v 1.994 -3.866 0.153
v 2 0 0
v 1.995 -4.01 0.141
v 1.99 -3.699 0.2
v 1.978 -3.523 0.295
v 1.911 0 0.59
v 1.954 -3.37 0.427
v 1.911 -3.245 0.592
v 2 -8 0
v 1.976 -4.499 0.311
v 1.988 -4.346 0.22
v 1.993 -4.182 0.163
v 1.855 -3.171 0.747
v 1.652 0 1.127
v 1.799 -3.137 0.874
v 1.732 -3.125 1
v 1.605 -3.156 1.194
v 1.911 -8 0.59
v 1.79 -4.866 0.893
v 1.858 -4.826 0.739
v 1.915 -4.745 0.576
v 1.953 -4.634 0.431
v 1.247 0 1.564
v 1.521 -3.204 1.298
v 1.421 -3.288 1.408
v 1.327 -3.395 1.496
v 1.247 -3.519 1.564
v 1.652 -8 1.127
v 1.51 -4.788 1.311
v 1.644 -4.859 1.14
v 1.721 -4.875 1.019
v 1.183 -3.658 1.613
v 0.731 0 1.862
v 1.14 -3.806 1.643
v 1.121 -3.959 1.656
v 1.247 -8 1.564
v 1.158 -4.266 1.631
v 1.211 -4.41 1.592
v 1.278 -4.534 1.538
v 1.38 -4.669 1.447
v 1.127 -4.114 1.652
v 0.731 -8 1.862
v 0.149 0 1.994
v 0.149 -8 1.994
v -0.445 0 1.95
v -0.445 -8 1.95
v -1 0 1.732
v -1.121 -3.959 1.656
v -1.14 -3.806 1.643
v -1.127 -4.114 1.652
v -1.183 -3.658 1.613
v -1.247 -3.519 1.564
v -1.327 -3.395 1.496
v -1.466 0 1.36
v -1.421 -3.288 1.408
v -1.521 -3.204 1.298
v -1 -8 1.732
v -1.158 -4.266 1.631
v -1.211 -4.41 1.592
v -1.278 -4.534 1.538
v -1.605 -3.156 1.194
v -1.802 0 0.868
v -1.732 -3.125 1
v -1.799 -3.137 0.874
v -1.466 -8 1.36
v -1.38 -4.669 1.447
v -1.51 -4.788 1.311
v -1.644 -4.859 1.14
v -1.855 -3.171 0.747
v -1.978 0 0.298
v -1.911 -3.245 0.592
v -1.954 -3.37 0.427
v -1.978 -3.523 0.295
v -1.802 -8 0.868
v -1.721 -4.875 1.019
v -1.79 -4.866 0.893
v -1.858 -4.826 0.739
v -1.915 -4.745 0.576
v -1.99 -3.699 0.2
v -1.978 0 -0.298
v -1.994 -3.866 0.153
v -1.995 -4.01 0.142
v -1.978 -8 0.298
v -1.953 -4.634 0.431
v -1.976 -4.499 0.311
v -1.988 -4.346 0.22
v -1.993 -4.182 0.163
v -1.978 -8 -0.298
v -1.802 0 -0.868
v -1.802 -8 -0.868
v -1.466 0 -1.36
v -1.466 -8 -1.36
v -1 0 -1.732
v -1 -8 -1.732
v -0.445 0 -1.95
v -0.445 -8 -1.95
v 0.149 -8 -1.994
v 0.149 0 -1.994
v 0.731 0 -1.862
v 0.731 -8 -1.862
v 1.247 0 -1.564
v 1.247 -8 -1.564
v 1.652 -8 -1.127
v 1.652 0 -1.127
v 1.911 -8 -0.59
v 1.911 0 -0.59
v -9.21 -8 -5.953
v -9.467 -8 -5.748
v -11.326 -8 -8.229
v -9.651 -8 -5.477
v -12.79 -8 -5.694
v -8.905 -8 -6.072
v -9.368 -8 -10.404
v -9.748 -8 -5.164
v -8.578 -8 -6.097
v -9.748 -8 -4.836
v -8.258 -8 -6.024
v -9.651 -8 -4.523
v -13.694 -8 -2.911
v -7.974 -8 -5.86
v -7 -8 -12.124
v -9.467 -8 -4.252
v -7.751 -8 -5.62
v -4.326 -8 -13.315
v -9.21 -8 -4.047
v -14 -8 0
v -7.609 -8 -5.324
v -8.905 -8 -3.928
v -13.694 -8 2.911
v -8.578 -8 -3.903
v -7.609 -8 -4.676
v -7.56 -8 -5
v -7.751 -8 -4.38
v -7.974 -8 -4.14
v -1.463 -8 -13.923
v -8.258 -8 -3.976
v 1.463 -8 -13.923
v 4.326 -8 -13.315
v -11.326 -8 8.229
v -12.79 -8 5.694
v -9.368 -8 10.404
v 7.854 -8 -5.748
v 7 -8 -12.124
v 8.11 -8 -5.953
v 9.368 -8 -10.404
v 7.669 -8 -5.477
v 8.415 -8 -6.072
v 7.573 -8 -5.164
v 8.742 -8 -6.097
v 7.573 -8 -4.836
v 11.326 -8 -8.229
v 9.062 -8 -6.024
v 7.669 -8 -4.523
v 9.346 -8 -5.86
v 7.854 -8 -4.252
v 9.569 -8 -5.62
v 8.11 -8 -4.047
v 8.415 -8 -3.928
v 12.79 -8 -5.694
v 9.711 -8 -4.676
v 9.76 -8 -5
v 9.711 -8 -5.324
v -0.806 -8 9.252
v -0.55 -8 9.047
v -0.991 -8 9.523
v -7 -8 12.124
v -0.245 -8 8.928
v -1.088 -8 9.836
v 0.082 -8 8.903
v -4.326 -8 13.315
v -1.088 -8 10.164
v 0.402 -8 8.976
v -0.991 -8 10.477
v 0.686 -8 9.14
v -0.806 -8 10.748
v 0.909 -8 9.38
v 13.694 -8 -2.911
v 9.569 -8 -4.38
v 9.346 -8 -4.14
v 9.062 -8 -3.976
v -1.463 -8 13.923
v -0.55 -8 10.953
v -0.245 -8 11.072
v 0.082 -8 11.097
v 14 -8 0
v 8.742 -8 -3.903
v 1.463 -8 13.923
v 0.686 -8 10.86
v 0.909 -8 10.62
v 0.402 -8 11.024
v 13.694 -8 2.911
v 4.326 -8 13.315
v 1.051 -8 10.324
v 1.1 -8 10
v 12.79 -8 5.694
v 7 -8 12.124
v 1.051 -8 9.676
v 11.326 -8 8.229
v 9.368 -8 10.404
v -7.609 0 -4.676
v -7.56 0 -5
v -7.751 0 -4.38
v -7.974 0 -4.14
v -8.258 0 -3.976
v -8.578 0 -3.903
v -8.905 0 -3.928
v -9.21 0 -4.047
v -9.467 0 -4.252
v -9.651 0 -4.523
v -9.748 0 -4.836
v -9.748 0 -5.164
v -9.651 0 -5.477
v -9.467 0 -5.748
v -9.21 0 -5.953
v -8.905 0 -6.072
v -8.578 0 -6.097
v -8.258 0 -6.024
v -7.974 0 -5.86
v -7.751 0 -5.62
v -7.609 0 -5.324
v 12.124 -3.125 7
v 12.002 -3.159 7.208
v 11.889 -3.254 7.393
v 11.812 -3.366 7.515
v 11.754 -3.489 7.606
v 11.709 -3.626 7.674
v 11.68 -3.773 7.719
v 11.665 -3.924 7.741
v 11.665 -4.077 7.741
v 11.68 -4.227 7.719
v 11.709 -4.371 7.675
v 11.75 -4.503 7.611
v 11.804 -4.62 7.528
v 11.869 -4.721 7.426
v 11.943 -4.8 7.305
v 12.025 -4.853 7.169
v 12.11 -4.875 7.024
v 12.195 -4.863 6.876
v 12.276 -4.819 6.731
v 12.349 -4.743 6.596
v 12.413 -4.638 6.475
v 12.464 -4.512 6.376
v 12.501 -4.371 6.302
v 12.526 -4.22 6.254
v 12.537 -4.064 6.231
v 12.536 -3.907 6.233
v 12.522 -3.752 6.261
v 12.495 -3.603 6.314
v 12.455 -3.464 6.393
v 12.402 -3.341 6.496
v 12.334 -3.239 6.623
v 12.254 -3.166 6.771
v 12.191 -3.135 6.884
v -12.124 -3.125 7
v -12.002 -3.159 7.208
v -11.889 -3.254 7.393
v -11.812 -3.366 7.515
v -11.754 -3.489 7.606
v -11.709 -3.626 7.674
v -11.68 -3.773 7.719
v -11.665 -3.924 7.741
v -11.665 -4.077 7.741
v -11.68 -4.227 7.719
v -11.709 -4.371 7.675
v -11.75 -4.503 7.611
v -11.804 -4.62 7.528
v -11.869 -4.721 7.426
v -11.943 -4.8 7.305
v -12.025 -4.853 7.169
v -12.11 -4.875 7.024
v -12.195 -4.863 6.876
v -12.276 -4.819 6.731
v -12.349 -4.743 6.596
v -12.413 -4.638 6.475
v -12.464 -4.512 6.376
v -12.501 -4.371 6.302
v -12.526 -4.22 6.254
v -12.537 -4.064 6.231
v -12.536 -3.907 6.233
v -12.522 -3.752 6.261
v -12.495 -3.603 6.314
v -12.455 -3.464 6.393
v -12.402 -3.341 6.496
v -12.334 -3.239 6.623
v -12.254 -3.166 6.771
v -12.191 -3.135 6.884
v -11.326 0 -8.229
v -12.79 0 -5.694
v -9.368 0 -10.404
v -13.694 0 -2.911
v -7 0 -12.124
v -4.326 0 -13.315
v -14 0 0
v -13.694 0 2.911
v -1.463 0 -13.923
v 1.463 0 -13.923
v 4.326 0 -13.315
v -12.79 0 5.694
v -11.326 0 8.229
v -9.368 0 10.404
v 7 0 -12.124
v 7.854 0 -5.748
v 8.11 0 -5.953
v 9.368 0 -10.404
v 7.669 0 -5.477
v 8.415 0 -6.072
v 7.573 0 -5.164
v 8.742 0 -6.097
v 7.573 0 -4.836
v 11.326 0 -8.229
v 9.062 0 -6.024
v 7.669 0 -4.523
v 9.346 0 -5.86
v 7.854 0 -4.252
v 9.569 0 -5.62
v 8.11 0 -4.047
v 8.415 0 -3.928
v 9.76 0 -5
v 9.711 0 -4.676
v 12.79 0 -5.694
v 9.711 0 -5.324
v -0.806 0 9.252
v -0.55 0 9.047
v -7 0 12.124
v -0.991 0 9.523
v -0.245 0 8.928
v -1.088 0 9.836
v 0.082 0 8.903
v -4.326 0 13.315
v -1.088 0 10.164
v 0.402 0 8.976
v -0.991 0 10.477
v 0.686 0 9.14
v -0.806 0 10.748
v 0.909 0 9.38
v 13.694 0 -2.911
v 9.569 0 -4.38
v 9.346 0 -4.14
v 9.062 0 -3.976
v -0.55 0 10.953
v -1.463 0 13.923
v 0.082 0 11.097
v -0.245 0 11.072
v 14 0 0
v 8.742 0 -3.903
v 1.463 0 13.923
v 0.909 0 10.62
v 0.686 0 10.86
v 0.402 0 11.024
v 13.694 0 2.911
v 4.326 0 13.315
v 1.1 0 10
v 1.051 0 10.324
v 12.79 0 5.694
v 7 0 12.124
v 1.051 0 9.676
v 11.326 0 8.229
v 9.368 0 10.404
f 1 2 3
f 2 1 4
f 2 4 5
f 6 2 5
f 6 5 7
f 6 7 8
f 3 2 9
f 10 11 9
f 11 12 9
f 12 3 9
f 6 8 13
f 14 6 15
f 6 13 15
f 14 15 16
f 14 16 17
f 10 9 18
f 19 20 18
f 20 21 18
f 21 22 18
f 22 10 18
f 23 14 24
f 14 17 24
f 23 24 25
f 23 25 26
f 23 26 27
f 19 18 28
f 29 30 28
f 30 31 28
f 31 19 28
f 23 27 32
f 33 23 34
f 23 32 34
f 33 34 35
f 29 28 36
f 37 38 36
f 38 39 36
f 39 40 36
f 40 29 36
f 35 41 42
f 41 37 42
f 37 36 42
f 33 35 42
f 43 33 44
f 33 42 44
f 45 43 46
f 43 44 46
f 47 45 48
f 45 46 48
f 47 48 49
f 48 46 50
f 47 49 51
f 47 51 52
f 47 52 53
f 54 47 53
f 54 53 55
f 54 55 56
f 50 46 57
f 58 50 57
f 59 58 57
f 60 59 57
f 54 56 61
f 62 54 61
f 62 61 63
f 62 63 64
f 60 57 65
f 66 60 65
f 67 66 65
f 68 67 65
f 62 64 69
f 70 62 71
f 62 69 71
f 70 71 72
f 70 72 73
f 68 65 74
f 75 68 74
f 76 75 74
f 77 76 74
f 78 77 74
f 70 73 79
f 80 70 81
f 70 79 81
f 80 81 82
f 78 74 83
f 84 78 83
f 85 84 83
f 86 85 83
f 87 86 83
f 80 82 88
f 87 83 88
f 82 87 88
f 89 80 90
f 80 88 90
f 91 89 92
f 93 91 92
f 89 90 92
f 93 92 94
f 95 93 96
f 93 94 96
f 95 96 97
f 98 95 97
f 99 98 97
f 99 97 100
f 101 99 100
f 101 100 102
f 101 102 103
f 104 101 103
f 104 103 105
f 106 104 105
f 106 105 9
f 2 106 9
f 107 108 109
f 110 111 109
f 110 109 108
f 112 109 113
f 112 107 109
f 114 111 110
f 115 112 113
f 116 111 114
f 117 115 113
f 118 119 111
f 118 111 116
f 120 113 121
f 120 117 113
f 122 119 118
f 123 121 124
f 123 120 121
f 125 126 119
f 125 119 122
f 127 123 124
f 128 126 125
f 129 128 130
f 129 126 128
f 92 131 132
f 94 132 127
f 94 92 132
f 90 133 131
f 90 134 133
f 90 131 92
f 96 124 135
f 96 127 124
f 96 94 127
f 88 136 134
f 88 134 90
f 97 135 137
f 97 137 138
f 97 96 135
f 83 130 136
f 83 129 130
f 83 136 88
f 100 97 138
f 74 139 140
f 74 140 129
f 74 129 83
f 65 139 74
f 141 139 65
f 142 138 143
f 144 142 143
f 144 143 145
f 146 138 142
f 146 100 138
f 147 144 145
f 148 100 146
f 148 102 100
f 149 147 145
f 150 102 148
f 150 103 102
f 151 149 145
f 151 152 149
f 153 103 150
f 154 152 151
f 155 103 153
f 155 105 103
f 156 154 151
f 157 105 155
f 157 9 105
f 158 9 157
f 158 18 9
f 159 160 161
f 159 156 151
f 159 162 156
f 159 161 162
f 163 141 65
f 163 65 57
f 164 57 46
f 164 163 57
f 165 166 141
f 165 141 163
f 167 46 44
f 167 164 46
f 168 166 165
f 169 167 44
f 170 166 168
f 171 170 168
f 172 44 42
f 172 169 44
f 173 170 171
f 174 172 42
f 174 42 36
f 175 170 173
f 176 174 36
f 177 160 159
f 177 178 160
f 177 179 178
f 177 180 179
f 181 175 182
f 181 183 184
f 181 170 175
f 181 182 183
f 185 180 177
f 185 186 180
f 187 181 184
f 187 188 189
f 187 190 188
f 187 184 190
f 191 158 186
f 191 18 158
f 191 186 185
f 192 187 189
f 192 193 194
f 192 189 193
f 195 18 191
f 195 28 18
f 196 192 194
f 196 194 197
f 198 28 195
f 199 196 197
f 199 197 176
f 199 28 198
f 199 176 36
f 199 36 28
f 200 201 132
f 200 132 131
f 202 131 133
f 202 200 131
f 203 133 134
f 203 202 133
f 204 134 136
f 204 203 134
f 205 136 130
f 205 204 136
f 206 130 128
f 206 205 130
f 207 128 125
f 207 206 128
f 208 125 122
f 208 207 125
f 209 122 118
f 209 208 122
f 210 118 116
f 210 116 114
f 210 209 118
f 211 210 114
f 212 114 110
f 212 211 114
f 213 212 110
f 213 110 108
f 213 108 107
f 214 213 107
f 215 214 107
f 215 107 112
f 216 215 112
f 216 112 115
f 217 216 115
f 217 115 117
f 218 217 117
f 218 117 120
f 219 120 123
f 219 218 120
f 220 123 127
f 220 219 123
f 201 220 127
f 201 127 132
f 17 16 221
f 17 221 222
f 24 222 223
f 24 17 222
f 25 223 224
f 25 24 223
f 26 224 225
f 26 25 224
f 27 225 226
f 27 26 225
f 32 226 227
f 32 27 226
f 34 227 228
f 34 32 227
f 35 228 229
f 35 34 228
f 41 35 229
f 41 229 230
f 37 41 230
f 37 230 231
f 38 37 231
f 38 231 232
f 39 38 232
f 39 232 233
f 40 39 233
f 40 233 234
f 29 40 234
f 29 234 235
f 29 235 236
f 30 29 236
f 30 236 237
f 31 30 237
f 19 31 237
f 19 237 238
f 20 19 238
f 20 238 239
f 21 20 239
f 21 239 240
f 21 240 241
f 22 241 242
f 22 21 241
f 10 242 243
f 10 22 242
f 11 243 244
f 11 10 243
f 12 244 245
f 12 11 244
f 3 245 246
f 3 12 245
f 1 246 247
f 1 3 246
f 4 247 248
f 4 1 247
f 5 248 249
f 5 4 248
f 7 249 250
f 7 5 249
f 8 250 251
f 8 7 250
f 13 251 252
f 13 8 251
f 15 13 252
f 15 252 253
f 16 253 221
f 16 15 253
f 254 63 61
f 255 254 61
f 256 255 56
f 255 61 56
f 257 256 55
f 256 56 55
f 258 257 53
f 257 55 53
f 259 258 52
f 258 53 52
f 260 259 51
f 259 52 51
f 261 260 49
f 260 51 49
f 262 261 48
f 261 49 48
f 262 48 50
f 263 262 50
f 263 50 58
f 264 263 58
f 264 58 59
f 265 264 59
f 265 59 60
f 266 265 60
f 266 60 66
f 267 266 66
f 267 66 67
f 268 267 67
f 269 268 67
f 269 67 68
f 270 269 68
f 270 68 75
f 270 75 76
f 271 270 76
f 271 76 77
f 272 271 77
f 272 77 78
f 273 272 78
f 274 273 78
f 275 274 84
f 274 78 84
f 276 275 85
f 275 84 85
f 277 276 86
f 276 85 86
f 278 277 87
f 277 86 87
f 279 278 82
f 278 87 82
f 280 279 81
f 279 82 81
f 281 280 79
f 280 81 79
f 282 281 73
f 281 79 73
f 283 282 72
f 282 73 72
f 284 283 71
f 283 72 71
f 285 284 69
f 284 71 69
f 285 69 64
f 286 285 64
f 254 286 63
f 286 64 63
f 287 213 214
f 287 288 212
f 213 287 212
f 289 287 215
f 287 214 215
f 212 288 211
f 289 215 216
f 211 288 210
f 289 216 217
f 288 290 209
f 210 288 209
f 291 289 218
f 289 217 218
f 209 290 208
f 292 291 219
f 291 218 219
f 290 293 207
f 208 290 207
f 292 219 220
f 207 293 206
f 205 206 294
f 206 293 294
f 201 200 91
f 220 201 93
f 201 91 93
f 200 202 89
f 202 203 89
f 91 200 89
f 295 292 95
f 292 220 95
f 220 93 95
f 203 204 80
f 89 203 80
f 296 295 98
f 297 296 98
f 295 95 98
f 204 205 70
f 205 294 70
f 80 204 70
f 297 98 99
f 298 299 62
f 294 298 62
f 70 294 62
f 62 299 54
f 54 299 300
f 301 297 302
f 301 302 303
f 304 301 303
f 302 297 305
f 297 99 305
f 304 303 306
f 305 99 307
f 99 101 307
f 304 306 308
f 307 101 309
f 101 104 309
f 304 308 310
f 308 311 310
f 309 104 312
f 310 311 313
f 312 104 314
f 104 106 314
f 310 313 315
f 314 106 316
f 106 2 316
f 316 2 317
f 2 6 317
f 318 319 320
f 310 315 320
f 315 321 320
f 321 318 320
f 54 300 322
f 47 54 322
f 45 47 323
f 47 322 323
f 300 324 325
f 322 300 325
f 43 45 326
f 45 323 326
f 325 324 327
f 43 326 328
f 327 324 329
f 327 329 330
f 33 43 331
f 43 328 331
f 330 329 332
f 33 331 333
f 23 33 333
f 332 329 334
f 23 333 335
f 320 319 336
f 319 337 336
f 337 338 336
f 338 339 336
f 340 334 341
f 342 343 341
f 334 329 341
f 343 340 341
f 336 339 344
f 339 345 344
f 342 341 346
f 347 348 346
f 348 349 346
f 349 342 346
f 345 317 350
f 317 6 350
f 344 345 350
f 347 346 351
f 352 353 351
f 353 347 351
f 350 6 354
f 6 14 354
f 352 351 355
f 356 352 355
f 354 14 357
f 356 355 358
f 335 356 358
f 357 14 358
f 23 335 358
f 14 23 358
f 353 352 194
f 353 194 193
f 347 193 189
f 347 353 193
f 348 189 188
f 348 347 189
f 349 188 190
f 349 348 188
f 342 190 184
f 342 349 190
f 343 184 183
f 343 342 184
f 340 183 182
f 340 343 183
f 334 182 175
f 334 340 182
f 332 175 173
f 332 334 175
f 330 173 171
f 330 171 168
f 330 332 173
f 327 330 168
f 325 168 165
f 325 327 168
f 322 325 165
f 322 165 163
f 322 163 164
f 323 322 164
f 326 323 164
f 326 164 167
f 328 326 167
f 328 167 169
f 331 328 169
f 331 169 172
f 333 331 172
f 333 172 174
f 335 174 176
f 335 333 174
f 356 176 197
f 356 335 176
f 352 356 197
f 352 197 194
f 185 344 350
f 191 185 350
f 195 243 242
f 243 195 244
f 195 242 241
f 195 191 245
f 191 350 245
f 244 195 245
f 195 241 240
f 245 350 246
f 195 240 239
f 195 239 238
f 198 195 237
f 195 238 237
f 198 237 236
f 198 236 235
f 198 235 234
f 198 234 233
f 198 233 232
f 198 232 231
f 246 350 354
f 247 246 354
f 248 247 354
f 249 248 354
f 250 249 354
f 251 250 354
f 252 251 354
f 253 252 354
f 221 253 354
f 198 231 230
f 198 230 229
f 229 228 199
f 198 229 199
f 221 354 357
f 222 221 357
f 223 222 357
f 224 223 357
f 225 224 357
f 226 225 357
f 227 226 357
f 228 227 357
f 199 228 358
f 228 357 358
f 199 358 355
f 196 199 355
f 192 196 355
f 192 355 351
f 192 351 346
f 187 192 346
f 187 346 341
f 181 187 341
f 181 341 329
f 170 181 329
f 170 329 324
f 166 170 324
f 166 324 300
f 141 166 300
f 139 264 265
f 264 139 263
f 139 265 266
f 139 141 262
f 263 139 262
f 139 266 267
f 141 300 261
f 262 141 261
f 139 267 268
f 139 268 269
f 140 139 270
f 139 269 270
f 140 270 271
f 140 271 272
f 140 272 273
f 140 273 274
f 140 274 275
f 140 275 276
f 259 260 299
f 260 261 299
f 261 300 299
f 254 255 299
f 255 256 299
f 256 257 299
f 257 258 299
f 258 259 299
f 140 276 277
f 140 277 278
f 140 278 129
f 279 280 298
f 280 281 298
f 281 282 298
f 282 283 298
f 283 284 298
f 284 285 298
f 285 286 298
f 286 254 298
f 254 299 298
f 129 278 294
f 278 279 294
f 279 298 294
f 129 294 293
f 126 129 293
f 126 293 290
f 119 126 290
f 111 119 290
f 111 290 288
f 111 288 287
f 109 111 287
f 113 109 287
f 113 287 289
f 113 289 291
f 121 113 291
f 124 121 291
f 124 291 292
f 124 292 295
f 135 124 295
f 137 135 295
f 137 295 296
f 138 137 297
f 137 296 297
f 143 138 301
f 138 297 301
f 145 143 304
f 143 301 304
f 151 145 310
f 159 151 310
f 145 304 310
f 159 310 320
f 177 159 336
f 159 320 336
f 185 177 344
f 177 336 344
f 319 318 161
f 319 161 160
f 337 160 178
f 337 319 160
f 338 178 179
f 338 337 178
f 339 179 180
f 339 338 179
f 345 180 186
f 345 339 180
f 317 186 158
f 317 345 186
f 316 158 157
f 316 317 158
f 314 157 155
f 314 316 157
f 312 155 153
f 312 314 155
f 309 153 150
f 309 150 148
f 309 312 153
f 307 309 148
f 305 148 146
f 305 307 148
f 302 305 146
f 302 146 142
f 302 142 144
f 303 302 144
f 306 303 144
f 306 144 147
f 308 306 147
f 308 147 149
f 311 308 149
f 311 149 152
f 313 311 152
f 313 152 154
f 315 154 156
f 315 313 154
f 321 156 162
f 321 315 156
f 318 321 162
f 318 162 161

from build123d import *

# Parameters (mm, degrees)
F0_R     = 14
F0_R_2   = 1.1
F1_DEPTH = 8
F2_R     = 2
F3_DEPTH = 8.001
F6_R     = 0.875
F7_DEPTH = 19.125355653


# Not quite as in the source:
# - a pattern or mirror of a feature is missing from the dataset's text; its kind, count and spacing are read off the source's solid


with BuildPart() as f1:
    # F0 (on Front) → F1 (new body)
    with BuildSketch(Plane.XZ):
        Circle(F0_R)
        with Locations((-8.6602540378, -5)):
            Circle(F0_R_2, mode=Mode.SUBTRACT)
        with Locations((8.6602540378, -5)):
            Circle(F0_R_2, mode=Mode.SUBTRACT)
        with Locations((0, 10)):
            Circle(F0_R_2, mode=Mode.SUBTRACT)
    extrude(amount=F1_DEPTH)

    # F2 (on face) → F3 (cut, through all)
    with BuildSketch(Plane.XZ.offset(8)):
        Circle(F2_R)
    extrude(amount=-F3_DEPTH, mode=Mode.SUBTRACT)

    # F6 (on line) → F7 (cut, through all)
    with BuildSketch(Plane(origin=(0, 0, 0), x_dir=(0, 1, 0), z_dir=(0.8660254038, 0, -0.5))):
        with Locations((-4, 0)):
            Circle(F6_R)
    f7 = extrude(amount=-F7_DEPTH, mode=Mode.SUBTRACT)

    # F7_copies: F7 across plane
    add(f7.mirror(Plane(origin=(2e-05, 0, 0), x_dir=(-1e-06, 0, 1), z_dir=(1, 0, 1e-06))), mode=Mode.SUBTRACT)


solid = f1.part
